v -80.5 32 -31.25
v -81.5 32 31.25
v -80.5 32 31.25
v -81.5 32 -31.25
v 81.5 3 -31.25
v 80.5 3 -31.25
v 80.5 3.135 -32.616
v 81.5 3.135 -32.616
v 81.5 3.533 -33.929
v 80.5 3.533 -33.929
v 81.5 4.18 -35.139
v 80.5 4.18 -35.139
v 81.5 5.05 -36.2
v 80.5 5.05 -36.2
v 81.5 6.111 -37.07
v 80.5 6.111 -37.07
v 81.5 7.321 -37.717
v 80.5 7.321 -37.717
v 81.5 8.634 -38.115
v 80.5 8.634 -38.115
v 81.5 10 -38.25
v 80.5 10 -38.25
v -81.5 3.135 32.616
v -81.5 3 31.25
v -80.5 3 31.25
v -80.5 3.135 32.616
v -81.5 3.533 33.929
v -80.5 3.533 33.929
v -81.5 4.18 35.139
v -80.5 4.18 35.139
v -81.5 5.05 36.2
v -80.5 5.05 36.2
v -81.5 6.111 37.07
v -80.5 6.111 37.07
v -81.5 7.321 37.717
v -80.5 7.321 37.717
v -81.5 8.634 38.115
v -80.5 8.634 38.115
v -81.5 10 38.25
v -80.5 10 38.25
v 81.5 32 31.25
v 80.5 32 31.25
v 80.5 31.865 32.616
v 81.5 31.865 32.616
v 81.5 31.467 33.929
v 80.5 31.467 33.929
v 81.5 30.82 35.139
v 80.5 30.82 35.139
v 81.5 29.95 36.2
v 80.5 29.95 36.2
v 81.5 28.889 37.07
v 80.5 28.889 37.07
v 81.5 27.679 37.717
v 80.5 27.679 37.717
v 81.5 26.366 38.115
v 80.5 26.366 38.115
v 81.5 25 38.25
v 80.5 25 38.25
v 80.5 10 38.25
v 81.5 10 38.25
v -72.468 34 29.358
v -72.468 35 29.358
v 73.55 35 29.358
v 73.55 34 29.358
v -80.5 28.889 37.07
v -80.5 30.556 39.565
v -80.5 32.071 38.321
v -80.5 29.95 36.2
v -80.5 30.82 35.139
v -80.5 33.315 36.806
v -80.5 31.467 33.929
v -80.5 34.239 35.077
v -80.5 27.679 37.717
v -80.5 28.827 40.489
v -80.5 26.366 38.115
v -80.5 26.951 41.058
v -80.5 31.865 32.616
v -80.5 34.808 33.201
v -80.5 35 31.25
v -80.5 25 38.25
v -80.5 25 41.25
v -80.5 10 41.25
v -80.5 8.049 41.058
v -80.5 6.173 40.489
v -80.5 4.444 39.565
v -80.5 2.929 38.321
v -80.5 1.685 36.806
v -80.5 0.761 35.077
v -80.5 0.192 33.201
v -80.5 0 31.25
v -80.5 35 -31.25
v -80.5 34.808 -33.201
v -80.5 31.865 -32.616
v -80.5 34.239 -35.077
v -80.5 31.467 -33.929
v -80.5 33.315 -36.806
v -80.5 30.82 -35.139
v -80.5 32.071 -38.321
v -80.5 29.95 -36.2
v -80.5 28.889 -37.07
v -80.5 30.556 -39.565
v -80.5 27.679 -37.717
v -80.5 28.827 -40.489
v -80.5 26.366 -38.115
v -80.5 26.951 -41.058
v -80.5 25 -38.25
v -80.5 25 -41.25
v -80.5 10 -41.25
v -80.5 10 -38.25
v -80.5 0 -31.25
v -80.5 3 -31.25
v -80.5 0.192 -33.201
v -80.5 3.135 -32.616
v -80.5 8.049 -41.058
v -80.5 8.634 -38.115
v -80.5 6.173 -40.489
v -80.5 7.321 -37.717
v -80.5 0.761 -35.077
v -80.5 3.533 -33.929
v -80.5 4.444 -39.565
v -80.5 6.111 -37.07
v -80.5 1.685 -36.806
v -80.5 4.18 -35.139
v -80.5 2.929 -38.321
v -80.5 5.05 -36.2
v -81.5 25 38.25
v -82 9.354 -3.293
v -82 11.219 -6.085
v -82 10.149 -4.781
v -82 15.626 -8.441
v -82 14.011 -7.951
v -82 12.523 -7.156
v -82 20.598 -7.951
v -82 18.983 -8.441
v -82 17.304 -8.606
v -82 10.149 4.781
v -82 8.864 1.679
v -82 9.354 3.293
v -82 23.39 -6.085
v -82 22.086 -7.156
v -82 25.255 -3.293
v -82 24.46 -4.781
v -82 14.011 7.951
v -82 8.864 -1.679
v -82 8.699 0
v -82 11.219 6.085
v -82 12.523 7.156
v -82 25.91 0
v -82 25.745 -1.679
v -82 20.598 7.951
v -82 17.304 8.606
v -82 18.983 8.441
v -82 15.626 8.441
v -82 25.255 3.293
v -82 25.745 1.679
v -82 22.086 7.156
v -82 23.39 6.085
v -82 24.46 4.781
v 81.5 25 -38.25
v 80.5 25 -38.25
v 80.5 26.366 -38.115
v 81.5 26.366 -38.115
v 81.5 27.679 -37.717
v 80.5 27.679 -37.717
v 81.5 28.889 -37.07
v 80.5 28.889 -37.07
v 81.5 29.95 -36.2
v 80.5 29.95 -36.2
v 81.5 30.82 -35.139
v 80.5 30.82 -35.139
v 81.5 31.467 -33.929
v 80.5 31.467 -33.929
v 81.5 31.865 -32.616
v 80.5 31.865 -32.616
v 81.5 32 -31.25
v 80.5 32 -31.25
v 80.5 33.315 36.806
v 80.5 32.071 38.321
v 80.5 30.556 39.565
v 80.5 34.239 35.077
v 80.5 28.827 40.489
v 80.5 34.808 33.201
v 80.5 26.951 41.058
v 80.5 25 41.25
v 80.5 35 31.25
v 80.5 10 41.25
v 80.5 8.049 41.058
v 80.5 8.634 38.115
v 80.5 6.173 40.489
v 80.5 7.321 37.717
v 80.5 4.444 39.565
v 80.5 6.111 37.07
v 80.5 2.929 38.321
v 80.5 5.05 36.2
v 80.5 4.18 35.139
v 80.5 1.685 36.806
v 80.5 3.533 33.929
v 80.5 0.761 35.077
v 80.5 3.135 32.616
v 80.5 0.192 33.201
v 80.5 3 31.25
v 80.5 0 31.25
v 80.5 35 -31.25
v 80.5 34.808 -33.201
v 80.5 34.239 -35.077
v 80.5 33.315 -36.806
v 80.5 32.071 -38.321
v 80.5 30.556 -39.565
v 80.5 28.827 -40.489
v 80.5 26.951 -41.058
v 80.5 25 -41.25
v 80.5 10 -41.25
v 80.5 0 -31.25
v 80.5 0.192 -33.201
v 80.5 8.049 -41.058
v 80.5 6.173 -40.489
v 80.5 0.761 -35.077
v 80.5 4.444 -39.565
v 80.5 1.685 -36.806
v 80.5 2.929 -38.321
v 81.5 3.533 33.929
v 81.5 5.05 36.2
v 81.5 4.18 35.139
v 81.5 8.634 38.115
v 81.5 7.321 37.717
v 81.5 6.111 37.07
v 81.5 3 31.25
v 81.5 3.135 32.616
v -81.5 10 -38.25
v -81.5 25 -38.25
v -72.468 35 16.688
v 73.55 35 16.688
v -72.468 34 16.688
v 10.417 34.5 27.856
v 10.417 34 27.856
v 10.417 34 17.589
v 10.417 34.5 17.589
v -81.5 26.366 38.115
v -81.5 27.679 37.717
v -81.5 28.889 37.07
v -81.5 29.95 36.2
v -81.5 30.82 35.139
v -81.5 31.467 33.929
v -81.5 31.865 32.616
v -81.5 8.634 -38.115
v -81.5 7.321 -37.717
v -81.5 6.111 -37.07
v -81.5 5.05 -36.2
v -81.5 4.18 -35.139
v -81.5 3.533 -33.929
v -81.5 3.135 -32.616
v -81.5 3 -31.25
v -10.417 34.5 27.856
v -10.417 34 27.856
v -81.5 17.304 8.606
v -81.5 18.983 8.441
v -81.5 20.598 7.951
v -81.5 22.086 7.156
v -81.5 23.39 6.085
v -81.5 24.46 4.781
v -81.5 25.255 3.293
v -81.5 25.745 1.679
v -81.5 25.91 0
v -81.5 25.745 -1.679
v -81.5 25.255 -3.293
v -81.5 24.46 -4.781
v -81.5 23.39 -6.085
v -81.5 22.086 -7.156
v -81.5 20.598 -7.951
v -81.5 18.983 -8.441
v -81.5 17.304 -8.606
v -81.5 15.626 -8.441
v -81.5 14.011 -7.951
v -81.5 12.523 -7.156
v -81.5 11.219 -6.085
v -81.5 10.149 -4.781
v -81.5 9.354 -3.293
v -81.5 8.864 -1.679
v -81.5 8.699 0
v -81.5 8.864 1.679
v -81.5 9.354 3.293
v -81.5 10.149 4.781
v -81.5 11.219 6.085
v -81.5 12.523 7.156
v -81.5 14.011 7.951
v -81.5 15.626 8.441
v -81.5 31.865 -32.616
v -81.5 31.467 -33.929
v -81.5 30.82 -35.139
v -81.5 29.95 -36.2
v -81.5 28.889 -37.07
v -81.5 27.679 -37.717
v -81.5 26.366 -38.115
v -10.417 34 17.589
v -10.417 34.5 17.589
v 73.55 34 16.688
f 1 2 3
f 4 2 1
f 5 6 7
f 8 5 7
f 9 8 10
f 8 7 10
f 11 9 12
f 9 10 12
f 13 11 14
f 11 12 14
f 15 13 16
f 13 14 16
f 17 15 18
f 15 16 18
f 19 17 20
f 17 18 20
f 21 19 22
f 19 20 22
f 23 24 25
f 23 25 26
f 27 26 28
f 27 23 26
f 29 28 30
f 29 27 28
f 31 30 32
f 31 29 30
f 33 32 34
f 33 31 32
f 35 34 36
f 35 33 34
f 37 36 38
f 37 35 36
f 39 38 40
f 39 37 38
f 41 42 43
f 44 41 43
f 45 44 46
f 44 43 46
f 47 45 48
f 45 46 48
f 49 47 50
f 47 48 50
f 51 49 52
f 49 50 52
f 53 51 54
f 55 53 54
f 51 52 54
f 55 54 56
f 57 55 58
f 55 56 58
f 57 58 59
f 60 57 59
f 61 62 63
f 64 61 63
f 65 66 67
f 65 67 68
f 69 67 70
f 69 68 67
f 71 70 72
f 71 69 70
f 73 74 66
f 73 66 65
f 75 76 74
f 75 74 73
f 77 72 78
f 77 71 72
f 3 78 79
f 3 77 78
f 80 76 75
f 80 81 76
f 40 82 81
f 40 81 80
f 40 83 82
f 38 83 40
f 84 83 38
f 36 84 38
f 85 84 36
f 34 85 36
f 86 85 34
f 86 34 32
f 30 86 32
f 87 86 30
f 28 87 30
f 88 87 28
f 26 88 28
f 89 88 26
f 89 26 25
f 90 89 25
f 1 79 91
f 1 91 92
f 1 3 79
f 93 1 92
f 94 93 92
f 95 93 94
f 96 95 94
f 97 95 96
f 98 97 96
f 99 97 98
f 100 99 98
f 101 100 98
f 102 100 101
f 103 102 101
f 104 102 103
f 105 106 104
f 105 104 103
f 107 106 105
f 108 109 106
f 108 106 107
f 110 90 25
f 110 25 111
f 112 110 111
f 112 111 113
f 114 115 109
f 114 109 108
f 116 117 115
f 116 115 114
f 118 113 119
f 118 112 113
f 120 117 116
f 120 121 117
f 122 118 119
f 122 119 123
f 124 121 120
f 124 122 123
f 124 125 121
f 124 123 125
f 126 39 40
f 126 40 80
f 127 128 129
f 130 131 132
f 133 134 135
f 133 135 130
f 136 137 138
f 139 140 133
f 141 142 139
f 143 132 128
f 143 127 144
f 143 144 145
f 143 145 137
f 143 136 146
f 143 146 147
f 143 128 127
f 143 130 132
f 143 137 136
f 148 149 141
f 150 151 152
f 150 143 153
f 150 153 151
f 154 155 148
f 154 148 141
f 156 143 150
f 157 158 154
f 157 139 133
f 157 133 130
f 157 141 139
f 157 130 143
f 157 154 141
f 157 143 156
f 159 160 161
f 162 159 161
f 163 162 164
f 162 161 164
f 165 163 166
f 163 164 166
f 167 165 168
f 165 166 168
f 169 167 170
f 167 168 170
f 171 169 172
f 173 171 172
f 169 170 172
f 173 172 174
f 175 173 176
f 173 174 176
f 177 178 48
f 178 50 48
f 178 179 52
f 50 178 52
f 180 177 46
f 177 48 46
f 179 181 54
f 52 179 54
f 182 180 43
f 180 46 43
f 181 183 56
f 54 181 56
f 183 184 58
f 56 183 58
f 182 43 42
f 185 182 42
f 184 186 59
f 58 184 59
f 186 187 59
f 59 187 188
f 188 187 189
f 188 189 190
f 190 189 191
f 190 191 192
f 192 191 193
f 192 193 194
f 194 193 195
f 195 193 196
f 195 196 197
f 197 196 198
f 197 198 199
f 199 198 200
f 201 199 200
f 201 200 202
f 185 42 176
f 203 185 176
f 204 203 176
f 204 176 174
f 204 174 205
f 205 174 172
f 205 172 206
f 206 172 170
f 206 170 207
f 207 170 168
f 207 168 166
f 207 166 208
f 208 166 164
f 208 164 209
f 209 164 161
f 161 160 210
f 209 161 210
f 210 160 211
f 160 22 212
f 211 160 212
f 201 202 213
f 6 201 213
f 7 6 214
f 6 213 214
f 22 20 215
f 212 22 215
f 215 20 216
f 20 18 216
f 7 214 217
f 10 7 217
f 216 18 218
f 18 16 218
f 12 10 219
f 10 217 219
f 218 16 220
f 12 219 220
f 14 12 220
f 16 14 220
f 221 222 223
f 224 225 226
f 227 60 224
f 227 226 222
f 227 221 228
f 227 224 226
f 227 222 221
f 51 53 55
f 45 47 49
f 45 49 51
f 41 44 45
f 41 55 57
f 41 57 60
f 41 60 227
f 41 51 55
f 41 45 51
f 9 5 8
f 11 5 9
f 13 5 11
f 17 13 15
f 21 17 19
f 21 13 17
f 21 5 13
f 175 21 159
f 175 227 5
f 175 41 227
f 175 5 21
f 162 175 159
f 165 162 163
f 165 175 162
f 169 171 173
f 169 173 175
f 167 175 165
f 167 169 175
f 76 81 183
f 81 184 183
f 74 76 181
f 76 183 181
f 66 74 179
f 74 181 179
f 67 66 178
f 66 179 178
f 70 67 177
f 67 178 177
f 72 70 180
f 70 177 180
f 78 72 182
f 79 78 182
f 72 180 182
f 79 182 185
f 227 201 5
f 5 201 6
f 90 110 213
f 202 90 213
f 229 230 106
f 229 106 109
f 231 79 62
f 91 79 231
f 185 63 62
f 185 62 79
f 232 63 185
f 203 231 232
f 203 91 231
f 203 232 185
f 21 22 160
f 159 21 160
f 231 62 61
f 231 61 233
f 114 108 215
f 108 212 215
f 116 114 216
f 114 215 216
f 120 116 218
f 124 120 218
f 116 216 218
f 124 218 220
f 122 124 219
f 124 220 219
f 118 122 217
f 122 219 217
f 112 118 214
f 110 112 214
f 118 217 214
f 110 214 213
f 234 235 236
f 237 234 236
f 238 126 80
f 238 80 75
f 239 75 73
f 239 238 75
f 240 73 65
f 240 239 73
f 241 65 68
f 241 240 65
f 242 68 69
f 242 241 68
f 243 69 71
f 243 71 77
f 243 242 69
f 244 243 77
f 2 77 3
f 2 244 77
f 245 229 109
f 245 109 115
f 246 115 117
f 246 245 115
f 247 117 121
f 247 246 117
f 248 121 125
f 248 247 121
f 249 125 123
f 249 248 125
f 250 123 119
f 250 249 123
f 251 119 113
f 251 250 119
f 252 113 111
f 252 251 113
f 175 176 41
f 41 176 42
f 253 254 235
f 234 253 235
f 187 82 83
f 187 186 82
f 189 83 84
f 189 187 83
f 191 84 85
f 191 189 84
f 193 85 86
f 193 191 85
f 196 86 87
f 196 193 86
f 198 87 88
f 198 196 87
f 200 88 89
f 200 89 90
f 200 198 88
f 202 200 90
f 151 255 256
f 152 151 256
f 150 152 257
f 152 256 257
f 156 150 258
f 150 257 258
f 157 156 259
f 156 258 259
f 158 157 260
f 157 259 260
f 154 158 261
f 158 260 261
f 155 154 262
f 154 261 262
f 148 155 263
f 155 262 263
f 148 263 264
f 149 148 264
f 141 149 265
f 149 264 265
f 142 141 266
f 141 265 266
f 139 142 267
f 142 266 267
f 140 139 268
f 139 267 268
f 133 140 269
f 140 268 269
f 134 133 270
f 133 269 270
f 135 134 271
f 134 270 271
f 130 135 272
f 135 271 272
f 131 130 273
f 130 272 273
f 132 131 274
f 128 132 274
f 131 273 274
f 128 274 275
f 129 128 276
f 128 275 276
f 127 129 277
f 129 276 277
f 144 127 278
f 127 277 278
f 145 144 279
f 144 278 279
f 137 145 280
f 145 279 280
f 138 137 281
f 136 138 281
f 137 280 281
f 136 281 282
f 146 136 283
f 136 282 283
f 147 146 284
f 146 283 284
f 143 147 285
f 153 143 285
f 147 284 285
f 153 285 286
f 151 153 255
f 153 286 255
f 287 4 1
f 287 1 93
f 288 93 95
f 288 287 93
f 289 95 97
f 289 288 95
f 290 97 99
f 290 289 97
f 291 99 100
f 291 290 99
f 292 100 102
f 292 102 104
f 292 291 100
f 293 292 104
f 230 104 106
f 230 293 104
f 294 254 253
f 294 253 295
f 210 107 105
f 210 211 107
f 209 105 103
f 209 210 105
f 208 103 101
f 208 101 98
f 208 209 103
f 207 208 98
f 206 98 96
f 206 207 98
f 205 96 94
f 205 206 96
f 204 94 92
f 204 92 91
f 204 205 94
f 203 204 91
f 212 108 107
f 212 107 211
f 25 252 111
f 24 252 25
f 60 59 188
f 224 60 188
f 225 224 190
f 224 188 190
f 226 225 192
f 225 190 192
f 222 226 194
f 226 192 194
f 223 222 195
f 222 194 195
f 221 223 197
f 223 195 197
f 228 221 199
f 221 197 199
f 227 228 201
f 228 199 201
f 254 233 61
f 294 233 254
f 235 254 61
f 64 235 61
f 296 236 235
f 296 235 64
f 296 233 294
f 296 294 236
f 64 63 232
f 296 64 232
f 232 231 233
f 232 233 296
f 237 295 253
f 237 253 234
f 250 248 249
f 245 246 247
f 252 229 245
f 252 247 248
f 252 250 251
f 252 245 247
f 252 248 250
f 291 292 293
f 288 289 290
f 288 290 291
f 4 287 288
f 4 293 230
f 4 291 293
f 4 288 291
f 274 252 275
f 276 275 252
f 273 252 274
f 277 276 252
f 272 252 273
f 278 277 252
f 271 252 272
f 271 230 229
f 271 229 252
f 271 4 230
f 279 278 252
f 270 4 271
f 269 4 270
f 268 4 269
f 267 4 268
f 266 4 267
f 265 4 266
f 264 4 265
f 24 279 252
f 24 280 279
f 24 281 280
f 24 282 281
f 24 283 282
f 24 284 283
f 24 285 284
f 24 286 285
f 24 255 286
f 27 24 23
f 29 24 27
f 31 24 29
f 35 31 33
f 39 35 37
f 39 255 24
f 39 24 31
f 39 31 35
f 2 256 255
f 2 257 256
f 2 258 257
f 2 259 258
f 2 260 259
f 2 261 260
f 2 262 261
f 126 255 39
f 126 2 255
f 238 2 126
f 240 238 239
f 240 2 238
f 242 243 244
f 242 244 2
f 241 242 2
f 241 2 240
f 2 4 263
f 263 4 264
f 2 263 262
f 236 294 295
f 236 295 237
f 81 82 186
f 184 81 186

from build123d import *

# Parameters (mm, degrees)
SKETCH1_W           = 161
SKETCH1_H           = 82.5
BOSS_EXTRUDE1_DEPTH = 35
FILLET1_R           = 10
BOSS_EXTRUDE2_DEPTH = 1
BOSS_EXTRUDE3_START = 1
BOSS_EXTRUDE3_DEPTH = 1
SKETCH4_W           = 146.0174604
SKETCH4_H           = 12.670298151
CUT_EXTRUDE1_DEPTH  = 1
SKETCH6_W           = 20.834184422
SKETCH6_H           = 10.266465629
BOSS_EXTRUDE5_DEPTH = 0.5
SKETCH7_R           = 8.605932771
BOSS_EXTRUDE6_DEPTH = 0.5


with BuildPart() as part:
    # Sketch1 → Boss-Extrude1 (new body)
    with BuildSketch(Plane(origin=(0, 0, 0), x_dir=(1, 0, 0), z_dir=(0, 1, 0))):
        Rectangle(SKETCH1_W, SKETCH1_H)
    extrude(amount=BOSS_EXTRUDE1_DEPTH)

    # Fillet1
    fillet1_edges = [part.edges().sort_by_distance(p)[0] for p in [
        (0, 35, -41.25),
        (0, 0, -41.25),
        (0, 0, 41.25),
        (0, 35, 41.25),
    ]]
    fillet(fillet1_edges, radius=FILLET1_R)

    # Sketch2 → Boss-Extrude2 (add)
    with BuildSketch(Plane(origin=(80.5, 0, 0), x_dir=(0, 0, -1), z_dir=(1, 0, 0))):
        with BuildLine():
            Line((38.25, 10), (38.25, 25))
            ThreePointArc((38.25, 25), (36.199747468, 29.949747468), (31.25, 32))
            Line((31.25, 32), (-31.25, 32))
            ThreePointArc((-31.25, 32), (-36.199747468, 29.949747468), (-38.25, 25))
            Line((-38.25, 25), (-38.25, 10))
            ThreePointArc((-38.25, 10), (-36.199747468, 5.050252532), (-31.25, 3))
            Line((-31.25, 3), (31.25, 3))
            ThreePointArc((31.25, 3), (36.199747468, 5.050252532), (38.25, 10))
        make_face()
    extrude(amount=BOSS_EXTRUDE2_DEPTH)

    # Sketch3 → Boss-Extrude3 (add)
    with BuildSketch(Plane.ZY.offset(80.5).offset(BOSS_EXTRUDE3_START)):
        with BuildLine():
            Line((31.25, 32), (-31.25, 32))
            ThreePointArc((-31.25, 32), (-36.199747468, 29.949747468), (-38.25, 25))
            Line((-38.25, 25), (-38.25, 10))
            ThreePointArc((-38.25, 10), (-36.199747468, 5.050252532), (-31.25, 3))
            Line((-31.25, 3), (31.25, 3))
            ThreePointArc((31.25, 3), (36.199747468, 5.050252532), (38.25, 10))
            Line((38.25, 10), (38.25, 25))
            ThreePointArc((38.25, 25), (36.199747468, 29.949747468), (31.25, 32))
        make_face()
    extrude(amount=-BOSS_EXTRUDE3_DEPTH)

    # Sketch4 → Cut-Extrude1 (cut)
    with BuildSketch(Plane(origin=(0, 35, 0), x_dir=(1, 0, 0), z_dir=(0, 1, 0))):
        with Locations((0.540805409, -23.022858836)):
            Rectangle(SKETCH4_W, SKETCH4_H)
    extrude(amount=-CUT_EXTRUDE1_DEPTH, mode=Mode.SUBTRACT)

    # Sketch6 → Boss-Extrude5 (add)
    with BuildSketch(Plane(origin=(0, 34, 0), x_dir=(1, 0, 0), z_dir=(0, 1, 0))):
        with Locations((0, -22.722377564)):
            Rectangle(SKETCH6_W, SKETCH6_H)
    extrude(amount=BOSS_EXTRUDE5_DEPTH)

    # Sketch7 → Boss-Extrude6 (add)
    with BuildSketch(Plane.ZY.offset(81.5)):
        with Locations((0, 17.304485336)):
            Circle(SKETCH7_R)
    extrude(amount=BOSS_EXTRUDE6_DEPTH)


solid = part.part
